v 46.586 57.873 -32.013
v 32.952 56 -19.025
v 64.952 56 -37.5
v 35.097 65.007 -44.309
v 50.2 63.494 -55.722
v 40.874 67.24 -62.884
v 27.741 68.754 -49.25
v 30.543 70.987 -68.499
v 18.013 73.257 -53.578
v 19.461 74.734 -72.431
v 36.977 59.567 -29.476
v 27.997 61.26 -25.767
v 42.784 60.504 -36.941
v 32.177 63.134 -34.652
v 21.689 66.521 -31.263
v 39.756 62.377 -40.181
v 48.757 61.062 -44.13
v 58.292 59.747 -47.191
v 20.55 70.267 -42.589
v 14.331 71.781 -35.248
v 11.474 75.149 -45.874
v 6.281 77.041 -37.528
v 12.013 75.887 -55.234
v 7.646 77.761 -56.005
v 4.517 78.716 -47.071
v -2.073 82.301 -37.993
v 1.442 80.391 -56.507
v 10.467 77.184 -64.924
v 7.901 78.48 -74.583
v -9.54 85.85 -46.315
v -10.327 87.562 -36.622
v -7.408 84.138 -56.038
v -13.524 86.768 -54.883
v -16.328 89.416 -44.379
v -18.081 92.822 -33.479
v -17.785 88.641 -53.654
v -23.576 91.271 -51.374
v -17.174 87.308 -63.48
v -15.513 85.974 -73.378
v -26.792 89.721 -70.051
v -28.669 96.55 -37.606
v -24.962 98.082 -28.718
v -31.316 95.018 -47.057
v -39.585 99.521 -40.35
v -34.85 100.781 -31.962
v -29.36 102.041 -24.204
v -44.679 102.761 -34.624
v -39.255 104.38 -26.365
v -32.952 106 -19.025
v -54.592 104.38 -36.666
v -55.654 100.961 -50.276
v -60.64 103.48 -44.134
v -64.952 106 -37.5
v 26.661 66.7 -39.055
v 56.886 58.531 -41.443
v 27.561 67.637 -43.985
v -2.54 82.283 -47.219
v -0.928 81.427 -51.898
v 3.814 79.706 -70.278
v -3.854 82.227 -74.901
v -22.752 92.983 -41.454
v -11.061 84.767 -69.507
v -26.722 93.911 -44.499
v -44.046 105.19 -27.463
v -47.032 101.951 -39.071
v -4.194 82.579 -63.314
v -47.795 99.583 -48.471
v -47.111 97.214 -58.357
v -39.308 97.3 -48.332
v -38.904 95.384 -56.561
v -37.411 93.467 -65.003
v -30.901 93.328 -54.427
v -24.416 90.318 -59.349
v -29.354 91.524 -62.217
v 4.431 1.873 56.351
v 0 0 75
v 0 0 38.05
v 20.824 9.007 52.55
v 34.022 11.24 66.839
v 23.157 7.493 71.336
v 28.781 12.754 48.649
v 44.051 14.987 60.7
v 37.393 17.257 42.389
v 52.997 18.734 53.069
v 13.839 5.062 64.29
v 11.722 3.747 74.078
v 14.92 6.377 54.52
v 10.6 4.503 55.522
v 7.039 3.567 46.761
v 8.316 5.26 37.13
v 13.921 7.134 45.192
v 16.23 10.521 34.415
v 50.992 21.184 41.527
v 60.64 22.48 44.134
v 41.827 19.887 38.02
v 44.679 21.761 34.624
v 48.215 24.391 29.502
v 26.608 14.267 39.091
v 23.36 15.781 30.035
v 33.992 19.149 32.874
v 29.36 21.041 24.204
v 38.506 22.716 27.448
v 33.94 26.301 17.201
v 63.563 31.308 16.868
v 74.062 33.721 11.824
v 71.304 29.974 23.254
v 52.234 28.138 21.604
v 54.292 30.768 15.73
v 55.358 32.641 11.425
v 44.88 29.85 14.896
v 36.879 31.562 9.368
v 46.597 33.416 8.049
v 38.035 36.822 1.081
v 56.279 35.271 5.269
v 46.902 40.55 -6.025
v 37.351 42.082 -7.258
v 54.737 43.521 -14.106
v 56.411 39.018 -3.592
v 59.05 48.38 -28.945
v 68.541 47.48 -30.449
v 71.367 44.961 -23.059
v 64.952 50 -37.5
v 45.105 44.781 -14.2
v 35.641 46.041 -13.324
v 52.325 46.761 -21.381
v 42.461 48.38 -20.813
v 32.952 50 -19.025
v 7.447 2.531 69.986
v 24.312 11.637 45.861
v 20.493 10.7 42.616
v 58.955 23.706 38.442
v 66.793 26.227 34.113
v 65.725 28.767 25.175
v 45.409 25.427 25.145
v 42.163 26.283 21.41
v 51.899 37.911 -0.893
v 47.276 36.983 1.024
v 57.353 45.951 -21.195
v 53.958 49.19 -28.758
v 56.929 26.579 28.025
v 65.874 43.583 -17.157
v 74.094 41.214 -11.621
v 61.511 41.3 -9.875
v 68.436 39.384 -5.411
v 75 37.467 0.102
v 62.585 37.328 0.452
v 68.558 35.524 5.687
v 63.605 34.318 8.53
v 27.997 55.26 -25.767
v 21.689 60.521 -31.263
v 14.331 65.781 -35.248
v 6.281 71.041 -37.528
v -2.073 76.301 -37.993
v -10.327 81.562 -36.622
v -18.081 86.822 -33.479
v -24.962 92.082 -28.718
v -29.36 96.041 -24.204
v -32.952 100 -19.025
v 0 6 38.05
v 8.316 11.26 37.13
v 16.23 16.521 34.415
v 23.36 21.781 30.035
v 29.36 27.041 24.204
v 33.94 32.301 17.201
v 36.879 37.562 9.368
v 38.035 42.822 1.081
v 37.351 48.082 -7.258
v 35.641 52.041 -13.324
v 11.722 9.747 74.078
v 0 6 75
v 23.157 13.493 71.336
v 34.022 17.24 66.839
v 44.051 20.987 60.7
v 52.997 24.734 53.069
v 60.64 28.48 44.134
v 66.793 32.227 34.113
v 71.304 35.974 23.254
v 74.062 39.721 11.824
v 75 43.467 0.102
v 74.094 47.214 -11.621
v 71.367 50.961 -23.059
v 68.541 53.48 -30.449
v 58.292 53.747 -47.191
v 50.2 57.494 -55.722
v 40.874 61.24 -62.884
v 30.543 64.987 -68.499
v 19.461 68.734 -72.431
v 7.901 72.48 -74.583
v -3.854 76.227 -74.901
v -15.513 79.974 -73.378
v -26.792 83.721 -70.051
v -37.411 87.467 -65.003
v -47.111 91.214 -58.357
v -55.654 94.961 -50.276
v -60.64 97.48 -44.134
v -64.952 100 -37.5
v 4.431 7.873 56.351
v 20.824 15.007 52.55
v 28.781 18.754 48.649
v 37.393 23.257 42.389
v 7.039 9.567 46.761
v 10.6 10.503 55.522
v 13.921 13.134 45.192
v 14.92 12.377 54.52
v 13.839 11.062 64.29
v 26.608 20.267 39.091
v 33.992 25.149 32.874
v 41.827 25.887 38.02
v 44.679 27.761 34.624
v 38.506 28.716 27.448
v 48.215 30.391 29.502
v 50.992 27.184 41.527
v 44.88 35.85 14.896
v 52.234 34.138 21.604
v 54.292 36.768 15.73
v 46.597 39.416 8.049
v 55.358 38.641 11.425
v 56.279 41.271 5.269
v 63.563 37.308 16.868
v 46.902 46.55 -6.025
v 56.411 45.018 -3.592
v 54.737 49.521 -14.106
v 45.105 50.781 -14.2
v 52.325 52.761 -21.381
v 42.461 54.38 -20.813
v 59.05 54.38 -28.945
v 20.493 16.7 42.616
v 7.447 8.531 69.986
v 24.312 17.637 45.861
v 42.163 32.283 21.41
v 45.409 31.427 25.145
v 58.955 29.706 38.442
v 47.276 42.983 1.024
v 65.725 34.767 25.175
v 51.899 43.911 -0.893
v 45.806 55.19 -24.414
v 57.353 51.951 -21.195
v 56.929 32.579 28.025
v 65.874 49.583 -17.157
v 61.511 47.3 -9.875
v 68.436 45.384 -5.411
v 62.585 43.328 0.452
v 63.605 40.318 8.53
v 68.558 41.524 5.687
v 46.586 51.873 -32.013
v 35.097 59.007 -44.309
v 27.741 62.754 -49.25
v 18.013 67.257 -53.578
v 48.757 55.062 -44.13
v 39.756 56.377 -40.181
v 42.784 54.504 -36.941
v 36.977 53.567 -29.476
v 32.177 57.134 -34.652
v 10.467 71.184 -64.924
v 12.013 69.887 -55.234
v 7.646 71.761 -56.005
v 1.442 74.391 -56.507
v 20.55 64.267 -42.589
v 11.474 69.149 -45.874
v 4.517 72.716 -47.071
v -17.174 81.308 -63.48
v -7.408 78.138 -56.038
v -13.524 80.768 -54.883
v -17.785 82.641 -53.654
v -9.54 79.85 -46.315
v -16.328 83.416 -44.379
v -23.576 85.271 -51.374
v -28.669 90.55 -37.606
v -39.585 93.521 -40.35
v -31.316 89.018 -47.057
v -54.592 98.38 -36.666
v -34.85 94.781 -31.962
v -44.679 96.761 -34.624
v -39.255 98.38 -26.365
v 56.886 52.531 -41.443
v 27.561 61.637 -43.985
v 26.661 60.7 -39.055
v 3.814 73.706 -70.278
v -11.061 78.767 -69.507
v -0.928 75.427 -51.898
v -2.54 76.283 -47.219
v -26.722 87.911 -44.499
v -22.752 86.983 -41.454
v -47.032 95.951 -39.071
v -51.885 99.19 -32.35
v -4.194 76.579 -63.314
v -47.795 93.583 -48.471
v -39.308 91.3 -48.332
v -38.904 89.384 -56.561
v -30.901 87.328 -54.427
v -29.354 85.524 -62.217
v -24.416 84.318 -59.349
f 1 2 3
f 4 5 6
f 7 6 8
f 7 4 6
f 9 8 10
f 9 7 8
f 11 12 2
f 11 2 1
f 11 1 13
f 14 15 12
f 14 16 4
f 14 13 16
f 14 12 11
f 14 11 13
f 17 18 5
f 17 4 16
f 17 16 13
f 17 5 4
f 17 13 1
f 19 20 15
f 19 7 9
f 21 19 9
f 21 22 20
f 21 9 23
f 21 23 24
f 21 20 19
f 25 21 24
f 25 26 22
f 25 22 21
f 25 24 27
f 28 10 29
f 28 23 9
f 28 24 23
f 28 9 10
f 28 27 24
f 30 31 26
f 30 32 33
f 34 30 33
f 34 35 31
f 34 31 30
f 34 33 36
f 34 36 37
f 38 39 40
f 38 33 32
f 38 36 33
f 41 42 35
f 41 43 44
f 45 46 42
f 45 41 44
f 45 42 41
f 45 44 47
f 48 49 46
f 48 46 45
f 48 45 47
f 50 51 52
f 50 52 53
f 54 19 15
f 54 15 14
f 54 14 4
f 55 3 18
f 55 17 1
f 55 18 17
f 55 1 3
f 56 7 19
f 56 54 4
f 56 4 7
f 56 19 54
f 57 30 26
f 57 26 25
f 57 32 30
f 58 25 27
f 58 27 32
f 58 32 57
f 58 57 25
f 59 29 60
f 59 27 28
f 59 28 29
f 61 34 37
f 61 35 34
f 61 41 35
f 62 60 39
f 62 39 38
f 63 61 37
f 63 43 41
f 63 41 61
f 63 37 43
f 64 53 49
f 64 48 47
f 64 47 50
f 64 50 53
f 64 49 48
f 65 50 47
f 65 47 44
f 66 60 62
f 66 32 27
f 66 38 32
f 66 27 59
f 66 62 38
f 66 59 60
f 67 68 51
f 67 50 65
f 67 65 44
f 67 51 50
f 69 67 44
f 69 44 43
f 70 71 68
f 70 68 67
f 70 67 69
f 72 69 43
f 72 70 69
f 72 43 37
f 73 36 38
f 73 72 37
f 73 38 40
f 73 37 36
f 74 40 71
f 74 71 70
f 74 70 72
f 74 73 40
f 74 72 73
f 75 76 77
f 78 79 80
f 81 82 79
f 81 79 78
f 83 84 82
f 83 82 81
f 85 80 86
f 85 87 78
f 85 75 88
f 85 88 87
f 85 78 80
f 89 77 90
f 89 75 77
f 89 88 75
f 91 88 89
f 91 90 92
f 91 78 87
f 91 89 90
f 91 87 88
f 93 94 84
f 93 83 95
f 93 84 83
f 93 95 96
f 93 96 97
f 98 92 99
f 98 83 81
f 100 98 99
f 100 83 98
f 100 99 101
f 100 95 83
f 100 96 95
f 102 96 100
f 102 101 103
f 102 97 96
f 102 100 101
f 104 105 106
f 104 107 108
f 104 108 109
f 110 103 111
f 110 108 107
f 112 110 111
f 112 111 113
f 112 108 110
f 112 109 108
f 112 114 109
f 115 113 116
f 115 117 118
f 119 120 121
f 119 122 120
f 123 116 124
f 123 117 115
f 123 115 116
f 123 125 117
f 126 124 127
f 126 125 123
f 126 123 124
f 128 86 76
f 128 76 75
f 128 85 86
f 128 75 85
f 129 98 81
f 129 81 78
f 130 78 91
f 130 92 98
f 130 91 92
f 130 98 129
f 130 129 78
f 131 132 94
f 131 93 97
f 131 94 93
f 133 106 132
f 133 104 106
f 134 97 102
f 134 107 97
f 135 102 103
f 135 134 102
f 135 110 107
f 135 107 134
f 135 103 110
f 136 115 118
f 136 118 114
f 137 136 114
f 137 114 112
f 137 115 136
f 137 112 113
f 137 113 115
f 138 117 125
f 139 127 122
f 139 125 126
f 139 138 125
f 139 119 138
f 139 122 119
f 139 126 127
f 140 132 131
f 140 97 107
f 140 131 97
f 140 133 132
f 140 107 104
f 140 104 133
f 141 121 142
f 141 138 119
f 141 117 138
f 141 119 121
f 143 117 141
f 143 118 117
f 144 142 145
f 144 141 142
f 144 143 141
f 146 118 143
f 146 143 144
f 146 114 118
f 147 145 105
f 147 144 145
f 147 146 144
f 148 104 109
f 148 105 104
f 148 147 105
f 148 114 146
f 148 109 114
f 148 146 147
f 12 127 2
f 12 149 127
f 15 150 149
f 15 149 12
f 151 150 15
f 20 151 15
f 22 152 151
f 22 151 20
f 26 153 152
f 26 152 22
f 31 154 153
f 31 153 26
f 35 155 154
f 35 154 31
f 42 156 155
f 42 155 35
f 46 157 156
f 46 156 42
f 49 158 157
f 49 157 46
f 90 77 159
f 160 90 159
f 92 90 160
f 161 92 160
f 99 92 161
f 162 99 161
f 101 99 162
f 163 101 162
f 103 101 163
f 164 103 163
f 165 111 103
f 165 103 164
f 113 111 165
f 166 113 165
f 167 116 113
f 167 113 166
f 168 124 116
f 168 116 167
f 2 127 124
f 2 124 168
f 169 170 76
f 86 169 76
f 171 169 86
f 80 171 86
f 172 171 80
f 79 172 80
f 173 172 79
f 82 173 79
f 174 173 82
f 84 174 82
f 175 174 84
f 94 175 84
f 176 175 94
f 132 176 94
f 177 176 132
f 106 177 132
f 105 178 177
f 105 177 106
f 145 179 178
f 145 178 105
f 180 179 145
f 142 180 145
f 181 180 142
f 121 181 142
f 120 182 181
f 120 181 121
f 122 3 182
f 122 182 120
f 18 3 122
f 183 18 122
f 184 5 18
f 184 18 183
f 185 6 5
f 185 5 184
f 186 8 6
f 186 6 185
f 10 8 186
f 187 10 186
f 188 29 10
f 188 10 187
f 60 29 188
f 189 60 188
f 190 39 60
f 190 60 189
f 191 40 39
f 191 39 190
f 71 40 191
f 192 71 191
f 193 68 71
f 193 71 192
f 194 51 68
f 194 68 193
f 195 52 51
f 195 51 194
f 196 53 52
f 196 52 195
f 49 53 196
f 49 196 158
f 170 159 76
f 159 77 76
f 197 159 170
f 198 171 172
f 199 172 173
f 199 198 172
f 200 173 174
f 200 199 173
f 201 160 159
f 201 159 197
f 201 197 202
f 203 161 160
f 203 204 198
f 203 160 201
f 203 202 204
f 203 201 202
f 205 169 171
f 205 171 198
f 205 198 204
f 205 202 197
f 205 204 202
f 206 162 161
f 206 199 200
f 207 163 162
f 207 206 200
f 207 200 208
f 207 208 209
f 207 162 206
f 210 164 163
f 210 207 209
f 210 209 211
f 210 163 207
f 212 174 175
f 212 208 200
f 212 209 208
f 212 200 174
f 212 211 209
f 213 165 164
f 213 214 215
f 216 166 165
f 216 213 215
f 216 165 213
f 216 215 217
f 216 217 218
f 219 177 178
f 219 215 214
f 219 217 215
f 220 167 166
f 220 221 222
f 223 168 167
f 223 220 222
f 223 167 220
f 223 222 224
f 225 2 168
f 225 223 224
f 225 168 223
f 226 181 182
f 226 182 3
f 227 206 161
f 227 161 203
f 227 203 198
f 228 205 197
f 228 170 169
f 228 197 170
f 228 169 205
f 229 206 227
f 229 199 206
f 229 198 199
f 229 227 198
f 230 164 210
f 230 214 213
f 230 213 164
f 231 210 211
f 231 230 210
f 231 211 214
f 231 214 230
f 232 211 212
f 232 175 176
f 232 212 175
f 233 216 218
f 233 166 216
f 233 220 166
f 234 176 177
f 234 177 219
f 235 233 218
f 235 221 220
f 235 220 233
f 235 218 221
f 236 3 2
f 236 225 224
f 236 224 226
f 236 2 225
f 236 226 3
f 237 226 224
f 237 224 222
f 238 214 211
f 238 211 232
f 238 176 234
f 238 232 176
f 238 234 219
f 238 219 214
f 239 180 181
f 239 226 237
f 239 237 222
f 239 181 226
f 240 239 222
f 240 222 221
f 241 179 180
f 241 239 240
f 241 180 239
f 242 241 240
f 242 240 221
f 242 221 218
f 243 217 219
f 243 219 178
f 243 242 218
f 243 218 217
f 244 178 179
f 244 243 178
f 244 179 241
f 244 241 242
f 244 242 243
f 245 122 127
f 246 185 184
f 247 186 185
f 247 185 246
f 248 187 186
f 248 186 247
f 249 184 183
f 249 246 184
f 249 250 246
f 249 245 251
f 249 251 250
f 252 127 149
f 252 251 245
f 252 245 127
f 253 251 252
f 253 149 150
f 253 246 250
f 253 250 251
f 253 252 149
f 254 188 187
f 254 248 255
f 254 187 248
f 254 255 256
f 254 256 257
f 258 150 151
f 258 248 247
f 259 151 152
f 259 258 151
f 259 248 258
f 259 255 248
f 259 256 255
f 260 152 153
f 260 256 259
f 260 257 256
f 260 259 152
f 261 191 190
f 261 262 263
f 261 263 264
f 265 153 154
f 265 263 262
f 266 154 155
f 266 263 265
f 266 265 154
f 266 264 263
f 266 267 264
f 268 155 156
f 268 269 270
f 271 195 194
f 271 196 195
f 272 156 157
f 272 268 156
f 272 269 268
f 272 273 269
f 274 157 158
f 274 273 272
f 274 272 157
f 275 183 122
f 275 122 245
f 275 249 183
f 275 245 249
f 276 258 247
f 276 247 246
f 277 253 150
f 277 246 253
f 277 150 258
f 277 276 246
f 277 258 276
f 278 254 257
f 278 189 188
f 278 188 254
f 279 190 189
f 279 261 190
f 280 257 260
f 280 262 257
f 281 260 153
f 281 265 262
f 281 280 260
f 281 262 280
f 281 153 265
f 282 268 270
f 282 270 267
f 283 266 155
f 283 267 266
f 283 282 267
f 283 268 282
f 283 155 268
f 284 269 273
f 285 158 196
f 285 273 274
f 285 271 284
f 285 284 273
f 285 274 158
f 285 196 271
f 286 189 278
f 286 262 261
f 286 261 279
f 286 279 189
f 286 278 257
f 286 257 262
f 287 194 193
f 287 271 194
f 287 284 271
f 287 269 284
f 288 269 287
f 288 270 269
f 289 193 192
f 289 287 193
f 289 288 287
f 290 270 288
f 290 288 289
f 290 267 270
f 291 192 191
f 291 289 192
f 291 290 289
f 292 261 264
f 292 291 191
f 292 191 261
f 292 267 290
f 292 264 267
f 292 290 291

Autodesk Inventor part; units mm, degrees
ref_plane "YZ Plane" through (0, 0, 0) normal (1, 0, 0) x (0, 1, 0)
ref_plane "XY Plane" through (0, 0, 0) normal (0, 0, 1) x (1, 0, 0)
sketch "Sketch1" plane through (0, 0, 0) normal (0, 1, 0) x (-1, 0, 0)
  circle A0 centre (0, 0) radius 38.05 construction
  line L0 (0, 0) -> (0, 38.05) construction
  dimension "d0" = 76.1
ref_plane "Work Plane1" through (0, 6, 0) normal (0, 1, 0) x (-1, 0, 0)
sketch "Sketch2" plane through (0, 6, 0) normal (0, 1, 0) x (-1, 0, 0)
  circle A0 centre (0, 0) radius 75 construction
  line L0 (0, 0) -> (0, 75) construction
  dimension "d2" = 150
sketch "Sketch3" plane through (0, 0, 0) normal (1, 0, 0) x (0, 1, 0)
  line L0 (0, 38.05) -> (6, 38.05)
  line L1 (6, 38.05) -> (6, 75)
  line L2 (6, 75) -> (0, 75)
  line L3 (0, 75) -> (0, 38.05)
  line L4 (0, 0) -> (150, 0) construction
  line L5 (0, 0) -> (0, 38.05)
  line L6 (6, 75) -> (6, 0) construction
  dimension "d3" = 150
  dimension "d12" = 38.05
  dimension "d13" = 75
  dimension "d14" = 6
coil "Coil1" sketch "Sketch3" operation add axis through (0, 0, 0) along (0, 1, 0) pitch 150 turns 0.666667 hand right
equation "\"d0\" = ø_Int_Espira_01"
equation "\"d2\" = ø_Ext_Espira_01"
equation "\"d12\" = 0.5 * ø_Int_Espira_01"
equation "\"d13\" = 0.5 * ø_Ext_Espira_01"
equation "\"d14\" = Espesor_Espira_01"
equation "\"d6\" = Ang_parcial"
equation "\"ø_Ext_Espira_01\" = 150"
equation "\"ø_Int_Espira_01\" = 76.1"
equation "\"Espesor_Espira_01\" = 6"
equation "\"d1\" = Espesor_Espira_01"
equation "\"L_parcial\" = 276.66667"
equation "\"Ang_parcial\" = 0.666667"
properties part number "Espira_01_Parcial"
